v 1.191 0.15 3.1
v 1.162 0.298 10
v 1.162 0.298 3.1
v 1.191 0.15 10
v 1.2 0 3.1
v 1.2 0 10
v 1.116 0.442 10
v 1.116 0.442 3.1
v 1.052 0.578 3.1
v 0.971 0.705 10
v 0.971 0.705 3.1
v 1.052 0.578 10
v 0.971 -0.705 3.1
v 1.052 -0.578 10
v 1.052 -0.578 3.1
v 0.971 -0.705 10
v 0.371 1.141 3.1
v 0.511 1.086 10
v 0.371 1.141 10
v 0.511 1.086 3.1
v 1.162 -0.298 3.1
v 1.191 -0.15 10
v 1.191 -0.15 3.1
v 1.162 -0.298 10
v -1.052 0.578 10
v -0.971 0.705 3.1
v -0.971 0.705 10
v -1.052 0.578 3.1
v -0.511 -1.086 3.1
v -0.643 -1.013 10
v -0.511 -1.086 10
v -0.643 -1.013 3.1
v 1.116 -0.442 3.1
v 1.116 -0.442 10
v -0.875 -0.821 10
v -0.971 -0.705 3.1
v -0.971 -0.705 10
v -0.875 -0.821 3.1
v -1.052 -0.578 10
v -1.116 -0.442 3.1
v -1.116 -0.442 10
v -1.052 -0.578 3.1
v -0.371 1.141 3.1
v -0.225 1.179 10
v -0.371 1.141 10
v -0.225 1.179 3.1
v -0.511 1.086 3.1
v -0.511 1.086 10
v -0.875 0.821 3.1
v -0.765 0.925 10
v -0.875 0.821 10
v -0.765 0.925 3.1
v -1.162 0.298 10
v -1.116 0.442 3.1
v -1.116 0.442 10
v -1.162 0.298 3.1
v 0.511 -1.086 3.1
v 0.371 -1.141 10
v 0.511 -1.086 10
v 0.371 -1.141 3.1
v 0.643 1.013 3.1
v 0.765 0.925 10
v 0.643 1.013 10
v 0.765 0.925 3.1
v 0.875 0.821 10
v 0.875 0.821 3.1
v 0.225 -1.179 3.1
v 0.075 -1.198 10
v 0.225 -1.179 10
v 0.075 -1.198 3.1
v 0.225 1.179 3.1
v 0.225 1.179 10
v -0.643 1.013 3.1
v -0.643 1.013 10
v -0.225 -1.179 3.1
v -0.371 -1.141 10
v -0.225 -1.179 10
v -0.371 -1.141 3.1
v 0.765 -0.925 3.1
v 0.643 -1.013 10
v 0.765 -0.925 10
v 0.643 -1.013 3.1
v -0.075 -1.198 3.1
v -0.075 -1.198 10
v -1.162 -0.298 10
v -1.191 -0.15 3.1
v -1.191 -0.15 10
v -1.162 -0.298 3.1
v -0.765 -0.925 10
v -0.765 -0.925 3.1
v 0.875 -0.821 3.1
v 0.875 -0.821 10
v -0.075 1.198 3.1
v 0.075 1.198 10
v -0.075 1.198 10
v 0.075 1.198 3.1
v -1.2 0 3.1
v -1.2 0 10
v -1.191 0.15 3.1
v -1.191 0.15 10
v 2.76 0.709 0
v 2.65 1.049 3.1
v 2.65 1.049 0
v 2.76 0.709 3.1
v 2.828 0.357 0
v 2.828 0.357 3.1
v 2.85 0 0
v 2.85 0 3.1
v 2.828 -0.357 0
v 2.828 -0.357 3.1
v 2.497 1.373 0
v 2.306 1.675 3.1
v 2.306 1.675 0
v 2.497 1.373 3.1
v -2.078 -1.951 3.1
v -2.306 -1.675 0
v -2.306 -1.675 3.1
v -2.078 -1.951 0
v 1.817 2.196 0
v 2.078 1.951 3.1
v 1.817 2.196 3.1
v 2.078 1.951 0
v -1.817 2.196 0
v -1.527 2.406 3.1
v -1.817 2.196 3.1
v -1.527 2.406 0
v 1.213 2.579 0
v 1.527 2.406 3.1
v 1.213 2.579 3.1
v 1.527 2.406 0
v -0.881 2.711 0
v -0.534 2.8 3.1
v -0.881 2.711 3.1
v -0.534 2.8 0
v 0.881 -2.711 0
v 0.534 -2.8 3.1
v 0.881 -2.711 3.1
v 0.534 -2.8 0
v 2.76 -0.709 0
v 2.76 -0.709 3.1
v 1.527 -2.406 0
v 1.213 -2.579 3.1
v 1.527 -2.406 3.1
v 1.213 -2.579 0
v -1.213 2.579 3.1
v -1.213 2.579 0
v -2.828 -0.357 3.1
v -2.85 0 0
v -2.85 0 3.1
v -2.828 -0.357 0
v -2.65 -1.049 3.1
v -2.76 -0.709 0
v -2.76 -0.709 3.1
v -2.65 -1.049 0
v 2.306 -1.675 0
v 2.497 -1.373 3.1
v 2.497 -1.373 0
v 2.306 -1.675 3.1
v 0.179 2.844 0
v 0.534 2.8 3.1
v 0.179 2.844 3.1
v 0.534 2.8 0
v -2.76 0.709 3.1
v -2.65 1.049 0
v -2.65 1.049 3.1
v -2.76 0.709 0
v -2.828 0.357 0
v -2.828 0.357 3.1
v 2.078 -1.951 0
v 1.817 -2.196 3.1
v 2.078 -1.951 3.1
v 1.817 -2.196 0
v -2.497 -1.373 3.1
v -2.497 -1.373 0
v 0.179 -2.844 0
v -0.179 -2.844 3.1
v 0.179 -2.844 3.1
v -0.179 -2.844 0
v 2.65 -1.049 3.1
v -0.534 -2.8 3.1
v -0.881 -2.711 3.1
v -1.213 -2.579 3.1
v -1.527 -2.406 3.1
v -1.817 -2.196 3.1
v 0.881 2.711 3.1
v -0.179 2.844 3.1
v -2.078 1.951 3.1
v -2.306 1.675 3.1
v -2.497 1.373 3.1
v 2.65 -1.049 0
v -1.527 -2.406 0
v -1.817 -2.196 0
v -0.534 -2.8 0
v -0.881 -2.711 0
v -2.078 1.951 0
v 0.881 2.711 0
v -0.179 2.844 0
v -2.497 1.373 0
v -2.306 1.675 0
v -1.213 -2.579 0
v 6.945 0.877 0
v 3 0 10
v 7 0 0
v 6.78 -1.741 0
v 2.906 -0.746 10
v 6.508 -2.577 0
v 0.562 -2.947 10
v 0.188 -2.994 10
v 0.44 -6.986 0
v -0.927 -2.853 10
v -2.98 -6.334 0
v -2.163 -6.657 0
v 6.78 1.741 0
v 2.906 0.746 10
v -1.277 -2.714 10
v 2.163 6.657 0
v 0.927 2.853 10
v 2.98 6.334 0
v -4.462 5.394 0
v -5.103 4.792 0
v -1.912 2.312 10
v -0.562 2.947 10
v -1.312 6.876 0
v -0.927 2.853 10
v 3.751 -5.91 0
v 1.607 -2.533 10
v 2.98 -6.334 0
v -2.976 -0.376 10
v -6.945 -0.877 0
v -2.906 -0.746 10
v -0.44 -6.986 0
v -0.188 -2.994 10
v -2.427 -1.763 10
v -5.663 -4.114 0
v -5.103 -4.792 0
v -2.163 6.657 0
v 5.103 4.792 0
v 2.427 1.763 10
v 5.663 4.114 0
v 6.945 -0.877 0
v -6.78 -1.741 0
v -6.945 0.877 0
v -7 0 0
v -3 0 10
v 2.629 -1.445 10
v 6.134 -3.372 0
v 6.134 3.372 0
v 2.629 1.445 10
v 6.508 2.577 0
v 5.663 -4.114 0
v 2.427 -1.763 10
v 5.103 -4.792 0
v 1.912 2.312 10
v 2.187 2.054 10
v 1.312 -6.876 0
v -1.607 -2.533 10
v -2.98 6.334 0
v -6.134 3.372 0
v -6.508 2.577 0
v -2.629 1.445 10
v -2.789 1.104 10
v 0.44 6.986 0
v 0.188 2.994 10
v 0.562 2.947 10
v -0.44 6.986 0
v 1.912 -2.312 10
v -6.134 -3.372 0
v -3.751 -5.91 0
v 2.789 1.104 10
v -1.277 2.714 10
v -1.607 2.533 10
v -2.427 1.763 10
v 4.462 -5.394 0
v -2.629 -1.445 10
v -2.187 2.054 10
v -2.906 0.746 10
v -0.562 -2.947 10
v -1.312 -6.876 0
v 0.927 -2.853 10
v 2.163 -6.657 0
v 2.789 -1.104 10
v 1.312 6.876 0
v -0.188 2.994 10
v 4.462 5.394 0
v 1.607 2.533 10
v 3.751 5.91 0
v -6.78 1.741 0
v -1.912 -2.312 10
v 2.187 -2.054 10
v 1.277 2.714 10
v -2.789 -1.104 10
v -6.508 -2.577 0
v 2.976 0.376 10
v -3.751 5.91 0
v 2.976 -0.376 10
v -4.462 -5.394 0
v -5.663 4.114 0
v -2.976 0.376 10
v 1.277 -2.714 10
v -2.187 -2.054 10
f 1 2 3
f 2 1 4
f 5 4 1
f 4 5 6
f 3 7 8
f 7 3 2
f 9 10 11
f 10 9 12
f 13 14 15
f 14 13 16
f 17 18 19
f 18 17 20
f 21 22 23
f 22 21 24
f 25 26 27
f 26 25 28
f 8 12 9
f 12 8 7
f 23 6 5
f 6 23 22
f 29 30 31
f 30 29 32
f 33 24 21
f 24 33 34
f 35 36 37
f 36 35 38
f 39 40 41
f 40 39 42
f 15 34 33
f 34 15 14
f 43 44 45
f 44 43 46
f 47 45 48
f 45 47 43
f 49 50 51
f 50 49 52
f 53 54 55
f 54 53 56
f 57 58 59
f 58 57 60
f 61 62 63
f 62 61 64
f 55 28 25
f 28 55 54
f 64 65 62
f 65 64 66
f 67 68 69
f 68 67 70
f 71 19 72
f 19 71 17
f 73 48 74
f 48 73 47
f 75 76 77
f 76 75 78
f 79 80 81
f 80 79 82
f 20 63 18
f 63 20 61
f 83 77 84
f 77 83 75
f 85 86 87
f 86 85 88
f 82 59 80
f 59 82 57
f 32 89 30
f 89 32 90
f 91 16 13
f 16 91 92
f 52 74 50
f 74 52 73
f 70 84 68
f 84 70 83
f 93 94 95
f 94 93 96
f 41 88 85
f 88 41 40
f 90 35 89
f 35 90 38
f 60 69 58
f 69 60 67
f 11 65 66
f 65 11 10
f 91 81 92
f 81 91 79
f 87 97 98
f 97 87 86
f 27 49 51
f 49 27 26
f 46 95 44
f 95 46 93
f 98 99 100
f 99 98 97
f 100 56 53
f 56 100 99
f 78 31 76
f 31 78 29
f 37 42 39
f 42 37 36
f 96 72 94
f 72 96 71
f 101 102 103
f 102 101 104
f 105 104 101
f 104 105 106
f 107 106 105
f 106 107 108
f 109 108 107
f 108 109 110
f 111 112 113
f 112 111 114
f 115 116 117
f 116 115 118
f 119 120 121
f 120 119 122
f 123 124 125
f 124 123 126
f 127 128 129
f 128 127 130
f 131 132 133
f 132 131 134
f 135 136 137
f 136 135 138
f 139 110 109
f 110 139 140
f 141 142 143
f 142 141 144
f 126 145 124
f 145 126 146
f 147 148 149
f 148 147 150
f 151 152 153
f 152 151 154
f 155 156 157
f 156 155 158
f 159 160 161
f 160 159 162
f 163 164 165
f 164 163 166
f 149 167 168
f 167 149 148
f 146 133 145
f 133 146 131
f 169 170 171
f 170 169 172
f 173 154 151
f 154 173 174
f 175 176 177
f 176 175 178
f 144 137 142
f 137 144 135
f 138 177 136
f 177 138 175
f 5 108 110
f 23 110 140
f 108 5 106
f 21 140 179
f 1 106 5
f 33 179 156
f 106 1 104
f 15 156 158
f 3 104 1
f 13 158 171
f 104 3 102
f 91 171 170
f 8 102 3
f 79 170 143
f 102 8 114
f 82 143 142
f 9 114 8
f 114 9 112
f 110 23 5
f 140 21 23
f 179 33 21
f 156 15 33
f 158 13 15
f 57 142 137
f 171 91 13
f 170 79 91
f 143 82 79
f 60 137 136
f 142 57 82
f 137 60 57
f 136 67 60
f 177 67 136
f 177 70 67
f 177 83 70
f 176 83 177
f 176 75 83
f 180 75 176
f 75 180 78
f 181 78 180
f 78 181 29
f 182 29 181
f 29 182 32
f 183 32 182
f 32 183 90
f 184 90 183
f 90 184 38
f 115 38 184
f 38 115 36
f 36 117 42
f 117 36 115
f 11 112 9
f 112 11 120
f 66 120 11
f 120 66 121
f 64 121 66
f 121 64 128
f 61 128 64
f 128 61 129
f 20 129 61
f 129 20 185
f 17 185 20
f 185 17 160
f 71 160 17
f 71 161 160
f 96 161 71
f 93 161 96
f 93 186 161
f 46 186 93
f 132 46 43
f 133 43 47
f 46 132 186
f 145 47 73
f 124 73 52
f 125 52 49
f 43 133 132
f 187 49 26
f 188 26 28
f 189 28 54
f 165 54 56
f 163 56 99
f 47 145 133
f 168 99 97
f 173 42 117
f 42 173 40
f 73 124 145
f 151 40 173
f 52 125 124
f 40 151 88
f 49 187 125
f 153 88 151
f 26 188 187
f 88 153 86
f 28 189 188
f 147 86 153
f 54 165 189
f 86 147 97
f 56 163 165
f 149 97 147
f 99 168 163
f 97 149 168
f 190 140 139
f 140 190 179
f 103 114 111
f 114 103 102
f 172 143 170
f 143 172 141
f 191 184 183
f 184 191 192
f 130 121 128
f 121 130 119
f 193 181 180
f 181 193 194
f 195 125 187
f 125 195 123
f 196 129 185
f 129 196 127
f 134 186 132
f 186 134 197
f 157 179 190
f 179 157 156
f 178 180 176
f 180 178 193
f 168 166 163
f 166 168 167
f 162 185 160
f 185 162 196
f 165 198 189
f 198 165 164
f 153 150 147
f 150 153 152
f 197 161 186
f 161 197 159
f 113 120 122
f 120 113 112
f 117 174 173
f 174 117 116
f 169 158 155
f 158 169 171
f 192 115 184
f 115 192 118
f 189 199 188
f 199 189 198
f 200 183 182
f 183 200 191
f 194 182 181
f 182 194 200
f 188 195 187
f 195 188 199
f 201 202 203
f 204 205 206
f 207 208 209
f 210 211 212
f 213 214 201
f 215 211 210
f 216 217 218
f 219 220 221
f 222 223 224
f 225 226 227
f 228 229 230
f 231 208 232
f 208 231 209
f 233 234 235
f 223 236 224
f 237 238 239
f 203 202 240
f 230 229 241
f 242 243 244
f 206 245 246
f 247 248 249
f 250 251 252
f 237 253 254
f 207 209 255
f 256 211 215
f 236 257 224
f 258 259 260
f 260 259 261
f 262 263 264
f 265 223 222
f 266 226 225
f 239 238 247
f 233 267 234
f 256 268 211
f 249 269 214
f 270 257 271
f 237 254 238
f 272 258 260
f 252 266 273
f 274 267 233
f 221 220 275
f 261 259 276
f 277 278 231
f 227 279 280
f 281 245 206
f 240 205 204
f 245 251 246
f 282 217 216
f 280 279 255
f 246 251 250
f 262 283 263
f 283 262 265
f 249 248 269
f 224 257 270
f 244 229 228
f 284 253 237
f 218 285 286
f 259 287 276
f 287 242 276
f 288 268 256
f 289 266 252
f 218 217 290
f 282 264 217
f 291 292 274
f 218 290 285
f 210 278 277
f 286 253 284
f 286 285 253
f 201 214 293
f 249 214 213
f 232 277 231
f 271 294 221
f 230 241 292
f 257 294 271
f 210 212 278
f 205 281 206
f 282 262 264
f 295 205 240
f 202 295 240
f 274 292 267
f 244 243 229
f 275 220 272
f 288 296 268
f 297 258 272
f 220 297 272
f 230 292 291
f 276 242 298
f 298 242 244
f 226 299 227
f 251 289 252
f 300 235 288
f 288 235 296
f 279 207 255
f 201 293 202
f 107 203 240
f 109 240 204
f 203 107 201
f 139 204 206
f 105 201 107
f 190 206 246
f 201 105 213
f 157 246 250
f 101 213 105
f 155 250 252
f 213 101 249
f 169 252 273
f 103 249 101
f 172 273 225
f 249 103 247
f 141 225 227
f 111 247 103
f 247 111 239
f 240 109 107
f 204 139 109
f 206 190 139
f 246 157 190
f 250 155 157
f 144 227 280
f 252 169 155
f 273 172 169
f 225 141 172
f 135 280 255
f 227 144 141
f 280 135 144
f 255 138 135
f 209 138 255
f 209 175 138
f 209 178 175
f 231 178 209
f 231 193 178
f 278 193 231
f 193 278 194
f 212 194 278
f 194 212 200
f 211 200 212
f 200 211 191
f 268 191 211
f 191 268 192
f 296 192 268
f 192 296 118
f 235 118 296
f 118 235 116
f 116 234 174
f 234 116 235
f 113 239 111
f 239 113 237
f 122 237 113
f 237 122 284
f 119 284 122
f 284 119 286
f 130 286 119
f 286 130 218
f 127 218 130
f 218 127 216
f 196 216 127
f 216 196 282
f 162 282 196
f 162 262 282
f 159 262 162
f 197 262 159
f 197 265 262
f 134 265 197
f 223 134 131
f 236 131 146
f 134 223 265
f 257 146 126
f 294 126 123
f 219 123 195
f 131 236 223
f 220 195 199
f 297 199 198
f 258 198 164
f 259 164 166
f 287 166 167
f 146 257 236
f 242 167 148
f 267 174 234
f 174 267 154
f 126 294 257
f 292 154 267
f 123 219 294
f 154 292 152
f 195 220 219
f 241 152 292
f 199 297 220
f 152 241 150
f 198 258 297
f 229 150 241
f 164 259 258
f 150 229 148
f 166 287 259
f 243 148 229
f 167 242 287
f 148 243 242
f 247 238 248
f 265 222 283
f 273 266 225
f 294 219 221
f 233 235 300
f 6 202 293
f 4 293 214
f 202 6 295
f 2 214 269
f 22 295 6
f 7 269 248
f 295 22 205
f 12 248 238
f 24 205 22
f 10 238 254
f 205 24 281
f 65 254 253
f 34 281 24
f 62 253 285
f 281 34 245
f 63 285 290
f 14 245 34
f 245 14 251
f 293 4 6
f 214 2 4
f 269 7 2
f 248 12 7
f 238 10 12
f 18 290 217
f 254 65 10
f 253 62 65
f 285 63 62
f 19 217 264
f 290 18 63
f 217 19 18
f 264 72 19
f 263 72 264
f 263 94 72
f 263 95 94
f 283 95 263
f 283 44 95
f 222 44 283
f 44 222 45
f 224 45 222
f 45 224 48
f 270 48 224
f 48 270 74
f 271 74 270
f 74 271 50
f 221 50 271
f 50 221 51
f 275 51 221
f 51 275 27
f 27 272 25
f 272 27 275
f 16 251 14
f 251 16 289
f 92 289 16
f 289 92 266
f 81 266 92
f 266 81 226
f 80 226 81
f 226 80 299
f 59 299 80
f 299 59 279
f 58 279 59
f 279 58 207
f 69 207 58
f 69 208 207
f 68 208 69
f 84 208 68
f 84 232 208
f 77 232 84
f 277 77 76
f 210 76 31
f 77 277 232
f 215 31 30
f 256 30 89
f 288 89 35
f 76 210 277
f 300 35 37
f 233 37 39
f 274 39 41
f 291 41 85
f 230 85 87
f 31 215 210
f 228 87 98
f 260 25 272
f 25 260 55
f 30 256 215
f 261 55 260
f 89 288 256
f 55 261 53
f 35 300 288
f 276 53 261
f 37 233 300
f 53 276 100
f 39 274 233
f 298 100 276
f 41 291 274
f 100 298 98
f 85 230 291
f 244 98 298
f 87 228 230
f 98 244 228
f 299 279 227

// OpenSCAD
/*

  M3-Schraubenklebehilfe
  
  Kopfüber drucken!

*/


$fn = $preview ? 10 : 50;   // hier ändern für schnelleres Rendern

/*
Schlitzschraube
    din 84 / m3
    kopfhöhe 2.5
    kopfdurchmesser 5.5

*/

hoehe = 10.0;
durchmesserunten = 14.0;
durchmesseroben = 6.0;

schraubendurchmesser = 2.4;
schraubenkopfhoehe = 3.1;
schraubenkopfdurchmesser = 5.7;



difference() {
    union() {
        cylinder(h=hoehe, r1=durchmesserunten/2.0, r2=durchmesseroben/2.0);
    }
    
    union() {
        translate([0,0,-1])
        cylinder(h=18.0, d=schraubendurchmesser);

        translate([0,0,-1])
        cylinder(h=schraubenkopfhoehe+1, d=schraubenkopfdurchmesser);
    }
}
